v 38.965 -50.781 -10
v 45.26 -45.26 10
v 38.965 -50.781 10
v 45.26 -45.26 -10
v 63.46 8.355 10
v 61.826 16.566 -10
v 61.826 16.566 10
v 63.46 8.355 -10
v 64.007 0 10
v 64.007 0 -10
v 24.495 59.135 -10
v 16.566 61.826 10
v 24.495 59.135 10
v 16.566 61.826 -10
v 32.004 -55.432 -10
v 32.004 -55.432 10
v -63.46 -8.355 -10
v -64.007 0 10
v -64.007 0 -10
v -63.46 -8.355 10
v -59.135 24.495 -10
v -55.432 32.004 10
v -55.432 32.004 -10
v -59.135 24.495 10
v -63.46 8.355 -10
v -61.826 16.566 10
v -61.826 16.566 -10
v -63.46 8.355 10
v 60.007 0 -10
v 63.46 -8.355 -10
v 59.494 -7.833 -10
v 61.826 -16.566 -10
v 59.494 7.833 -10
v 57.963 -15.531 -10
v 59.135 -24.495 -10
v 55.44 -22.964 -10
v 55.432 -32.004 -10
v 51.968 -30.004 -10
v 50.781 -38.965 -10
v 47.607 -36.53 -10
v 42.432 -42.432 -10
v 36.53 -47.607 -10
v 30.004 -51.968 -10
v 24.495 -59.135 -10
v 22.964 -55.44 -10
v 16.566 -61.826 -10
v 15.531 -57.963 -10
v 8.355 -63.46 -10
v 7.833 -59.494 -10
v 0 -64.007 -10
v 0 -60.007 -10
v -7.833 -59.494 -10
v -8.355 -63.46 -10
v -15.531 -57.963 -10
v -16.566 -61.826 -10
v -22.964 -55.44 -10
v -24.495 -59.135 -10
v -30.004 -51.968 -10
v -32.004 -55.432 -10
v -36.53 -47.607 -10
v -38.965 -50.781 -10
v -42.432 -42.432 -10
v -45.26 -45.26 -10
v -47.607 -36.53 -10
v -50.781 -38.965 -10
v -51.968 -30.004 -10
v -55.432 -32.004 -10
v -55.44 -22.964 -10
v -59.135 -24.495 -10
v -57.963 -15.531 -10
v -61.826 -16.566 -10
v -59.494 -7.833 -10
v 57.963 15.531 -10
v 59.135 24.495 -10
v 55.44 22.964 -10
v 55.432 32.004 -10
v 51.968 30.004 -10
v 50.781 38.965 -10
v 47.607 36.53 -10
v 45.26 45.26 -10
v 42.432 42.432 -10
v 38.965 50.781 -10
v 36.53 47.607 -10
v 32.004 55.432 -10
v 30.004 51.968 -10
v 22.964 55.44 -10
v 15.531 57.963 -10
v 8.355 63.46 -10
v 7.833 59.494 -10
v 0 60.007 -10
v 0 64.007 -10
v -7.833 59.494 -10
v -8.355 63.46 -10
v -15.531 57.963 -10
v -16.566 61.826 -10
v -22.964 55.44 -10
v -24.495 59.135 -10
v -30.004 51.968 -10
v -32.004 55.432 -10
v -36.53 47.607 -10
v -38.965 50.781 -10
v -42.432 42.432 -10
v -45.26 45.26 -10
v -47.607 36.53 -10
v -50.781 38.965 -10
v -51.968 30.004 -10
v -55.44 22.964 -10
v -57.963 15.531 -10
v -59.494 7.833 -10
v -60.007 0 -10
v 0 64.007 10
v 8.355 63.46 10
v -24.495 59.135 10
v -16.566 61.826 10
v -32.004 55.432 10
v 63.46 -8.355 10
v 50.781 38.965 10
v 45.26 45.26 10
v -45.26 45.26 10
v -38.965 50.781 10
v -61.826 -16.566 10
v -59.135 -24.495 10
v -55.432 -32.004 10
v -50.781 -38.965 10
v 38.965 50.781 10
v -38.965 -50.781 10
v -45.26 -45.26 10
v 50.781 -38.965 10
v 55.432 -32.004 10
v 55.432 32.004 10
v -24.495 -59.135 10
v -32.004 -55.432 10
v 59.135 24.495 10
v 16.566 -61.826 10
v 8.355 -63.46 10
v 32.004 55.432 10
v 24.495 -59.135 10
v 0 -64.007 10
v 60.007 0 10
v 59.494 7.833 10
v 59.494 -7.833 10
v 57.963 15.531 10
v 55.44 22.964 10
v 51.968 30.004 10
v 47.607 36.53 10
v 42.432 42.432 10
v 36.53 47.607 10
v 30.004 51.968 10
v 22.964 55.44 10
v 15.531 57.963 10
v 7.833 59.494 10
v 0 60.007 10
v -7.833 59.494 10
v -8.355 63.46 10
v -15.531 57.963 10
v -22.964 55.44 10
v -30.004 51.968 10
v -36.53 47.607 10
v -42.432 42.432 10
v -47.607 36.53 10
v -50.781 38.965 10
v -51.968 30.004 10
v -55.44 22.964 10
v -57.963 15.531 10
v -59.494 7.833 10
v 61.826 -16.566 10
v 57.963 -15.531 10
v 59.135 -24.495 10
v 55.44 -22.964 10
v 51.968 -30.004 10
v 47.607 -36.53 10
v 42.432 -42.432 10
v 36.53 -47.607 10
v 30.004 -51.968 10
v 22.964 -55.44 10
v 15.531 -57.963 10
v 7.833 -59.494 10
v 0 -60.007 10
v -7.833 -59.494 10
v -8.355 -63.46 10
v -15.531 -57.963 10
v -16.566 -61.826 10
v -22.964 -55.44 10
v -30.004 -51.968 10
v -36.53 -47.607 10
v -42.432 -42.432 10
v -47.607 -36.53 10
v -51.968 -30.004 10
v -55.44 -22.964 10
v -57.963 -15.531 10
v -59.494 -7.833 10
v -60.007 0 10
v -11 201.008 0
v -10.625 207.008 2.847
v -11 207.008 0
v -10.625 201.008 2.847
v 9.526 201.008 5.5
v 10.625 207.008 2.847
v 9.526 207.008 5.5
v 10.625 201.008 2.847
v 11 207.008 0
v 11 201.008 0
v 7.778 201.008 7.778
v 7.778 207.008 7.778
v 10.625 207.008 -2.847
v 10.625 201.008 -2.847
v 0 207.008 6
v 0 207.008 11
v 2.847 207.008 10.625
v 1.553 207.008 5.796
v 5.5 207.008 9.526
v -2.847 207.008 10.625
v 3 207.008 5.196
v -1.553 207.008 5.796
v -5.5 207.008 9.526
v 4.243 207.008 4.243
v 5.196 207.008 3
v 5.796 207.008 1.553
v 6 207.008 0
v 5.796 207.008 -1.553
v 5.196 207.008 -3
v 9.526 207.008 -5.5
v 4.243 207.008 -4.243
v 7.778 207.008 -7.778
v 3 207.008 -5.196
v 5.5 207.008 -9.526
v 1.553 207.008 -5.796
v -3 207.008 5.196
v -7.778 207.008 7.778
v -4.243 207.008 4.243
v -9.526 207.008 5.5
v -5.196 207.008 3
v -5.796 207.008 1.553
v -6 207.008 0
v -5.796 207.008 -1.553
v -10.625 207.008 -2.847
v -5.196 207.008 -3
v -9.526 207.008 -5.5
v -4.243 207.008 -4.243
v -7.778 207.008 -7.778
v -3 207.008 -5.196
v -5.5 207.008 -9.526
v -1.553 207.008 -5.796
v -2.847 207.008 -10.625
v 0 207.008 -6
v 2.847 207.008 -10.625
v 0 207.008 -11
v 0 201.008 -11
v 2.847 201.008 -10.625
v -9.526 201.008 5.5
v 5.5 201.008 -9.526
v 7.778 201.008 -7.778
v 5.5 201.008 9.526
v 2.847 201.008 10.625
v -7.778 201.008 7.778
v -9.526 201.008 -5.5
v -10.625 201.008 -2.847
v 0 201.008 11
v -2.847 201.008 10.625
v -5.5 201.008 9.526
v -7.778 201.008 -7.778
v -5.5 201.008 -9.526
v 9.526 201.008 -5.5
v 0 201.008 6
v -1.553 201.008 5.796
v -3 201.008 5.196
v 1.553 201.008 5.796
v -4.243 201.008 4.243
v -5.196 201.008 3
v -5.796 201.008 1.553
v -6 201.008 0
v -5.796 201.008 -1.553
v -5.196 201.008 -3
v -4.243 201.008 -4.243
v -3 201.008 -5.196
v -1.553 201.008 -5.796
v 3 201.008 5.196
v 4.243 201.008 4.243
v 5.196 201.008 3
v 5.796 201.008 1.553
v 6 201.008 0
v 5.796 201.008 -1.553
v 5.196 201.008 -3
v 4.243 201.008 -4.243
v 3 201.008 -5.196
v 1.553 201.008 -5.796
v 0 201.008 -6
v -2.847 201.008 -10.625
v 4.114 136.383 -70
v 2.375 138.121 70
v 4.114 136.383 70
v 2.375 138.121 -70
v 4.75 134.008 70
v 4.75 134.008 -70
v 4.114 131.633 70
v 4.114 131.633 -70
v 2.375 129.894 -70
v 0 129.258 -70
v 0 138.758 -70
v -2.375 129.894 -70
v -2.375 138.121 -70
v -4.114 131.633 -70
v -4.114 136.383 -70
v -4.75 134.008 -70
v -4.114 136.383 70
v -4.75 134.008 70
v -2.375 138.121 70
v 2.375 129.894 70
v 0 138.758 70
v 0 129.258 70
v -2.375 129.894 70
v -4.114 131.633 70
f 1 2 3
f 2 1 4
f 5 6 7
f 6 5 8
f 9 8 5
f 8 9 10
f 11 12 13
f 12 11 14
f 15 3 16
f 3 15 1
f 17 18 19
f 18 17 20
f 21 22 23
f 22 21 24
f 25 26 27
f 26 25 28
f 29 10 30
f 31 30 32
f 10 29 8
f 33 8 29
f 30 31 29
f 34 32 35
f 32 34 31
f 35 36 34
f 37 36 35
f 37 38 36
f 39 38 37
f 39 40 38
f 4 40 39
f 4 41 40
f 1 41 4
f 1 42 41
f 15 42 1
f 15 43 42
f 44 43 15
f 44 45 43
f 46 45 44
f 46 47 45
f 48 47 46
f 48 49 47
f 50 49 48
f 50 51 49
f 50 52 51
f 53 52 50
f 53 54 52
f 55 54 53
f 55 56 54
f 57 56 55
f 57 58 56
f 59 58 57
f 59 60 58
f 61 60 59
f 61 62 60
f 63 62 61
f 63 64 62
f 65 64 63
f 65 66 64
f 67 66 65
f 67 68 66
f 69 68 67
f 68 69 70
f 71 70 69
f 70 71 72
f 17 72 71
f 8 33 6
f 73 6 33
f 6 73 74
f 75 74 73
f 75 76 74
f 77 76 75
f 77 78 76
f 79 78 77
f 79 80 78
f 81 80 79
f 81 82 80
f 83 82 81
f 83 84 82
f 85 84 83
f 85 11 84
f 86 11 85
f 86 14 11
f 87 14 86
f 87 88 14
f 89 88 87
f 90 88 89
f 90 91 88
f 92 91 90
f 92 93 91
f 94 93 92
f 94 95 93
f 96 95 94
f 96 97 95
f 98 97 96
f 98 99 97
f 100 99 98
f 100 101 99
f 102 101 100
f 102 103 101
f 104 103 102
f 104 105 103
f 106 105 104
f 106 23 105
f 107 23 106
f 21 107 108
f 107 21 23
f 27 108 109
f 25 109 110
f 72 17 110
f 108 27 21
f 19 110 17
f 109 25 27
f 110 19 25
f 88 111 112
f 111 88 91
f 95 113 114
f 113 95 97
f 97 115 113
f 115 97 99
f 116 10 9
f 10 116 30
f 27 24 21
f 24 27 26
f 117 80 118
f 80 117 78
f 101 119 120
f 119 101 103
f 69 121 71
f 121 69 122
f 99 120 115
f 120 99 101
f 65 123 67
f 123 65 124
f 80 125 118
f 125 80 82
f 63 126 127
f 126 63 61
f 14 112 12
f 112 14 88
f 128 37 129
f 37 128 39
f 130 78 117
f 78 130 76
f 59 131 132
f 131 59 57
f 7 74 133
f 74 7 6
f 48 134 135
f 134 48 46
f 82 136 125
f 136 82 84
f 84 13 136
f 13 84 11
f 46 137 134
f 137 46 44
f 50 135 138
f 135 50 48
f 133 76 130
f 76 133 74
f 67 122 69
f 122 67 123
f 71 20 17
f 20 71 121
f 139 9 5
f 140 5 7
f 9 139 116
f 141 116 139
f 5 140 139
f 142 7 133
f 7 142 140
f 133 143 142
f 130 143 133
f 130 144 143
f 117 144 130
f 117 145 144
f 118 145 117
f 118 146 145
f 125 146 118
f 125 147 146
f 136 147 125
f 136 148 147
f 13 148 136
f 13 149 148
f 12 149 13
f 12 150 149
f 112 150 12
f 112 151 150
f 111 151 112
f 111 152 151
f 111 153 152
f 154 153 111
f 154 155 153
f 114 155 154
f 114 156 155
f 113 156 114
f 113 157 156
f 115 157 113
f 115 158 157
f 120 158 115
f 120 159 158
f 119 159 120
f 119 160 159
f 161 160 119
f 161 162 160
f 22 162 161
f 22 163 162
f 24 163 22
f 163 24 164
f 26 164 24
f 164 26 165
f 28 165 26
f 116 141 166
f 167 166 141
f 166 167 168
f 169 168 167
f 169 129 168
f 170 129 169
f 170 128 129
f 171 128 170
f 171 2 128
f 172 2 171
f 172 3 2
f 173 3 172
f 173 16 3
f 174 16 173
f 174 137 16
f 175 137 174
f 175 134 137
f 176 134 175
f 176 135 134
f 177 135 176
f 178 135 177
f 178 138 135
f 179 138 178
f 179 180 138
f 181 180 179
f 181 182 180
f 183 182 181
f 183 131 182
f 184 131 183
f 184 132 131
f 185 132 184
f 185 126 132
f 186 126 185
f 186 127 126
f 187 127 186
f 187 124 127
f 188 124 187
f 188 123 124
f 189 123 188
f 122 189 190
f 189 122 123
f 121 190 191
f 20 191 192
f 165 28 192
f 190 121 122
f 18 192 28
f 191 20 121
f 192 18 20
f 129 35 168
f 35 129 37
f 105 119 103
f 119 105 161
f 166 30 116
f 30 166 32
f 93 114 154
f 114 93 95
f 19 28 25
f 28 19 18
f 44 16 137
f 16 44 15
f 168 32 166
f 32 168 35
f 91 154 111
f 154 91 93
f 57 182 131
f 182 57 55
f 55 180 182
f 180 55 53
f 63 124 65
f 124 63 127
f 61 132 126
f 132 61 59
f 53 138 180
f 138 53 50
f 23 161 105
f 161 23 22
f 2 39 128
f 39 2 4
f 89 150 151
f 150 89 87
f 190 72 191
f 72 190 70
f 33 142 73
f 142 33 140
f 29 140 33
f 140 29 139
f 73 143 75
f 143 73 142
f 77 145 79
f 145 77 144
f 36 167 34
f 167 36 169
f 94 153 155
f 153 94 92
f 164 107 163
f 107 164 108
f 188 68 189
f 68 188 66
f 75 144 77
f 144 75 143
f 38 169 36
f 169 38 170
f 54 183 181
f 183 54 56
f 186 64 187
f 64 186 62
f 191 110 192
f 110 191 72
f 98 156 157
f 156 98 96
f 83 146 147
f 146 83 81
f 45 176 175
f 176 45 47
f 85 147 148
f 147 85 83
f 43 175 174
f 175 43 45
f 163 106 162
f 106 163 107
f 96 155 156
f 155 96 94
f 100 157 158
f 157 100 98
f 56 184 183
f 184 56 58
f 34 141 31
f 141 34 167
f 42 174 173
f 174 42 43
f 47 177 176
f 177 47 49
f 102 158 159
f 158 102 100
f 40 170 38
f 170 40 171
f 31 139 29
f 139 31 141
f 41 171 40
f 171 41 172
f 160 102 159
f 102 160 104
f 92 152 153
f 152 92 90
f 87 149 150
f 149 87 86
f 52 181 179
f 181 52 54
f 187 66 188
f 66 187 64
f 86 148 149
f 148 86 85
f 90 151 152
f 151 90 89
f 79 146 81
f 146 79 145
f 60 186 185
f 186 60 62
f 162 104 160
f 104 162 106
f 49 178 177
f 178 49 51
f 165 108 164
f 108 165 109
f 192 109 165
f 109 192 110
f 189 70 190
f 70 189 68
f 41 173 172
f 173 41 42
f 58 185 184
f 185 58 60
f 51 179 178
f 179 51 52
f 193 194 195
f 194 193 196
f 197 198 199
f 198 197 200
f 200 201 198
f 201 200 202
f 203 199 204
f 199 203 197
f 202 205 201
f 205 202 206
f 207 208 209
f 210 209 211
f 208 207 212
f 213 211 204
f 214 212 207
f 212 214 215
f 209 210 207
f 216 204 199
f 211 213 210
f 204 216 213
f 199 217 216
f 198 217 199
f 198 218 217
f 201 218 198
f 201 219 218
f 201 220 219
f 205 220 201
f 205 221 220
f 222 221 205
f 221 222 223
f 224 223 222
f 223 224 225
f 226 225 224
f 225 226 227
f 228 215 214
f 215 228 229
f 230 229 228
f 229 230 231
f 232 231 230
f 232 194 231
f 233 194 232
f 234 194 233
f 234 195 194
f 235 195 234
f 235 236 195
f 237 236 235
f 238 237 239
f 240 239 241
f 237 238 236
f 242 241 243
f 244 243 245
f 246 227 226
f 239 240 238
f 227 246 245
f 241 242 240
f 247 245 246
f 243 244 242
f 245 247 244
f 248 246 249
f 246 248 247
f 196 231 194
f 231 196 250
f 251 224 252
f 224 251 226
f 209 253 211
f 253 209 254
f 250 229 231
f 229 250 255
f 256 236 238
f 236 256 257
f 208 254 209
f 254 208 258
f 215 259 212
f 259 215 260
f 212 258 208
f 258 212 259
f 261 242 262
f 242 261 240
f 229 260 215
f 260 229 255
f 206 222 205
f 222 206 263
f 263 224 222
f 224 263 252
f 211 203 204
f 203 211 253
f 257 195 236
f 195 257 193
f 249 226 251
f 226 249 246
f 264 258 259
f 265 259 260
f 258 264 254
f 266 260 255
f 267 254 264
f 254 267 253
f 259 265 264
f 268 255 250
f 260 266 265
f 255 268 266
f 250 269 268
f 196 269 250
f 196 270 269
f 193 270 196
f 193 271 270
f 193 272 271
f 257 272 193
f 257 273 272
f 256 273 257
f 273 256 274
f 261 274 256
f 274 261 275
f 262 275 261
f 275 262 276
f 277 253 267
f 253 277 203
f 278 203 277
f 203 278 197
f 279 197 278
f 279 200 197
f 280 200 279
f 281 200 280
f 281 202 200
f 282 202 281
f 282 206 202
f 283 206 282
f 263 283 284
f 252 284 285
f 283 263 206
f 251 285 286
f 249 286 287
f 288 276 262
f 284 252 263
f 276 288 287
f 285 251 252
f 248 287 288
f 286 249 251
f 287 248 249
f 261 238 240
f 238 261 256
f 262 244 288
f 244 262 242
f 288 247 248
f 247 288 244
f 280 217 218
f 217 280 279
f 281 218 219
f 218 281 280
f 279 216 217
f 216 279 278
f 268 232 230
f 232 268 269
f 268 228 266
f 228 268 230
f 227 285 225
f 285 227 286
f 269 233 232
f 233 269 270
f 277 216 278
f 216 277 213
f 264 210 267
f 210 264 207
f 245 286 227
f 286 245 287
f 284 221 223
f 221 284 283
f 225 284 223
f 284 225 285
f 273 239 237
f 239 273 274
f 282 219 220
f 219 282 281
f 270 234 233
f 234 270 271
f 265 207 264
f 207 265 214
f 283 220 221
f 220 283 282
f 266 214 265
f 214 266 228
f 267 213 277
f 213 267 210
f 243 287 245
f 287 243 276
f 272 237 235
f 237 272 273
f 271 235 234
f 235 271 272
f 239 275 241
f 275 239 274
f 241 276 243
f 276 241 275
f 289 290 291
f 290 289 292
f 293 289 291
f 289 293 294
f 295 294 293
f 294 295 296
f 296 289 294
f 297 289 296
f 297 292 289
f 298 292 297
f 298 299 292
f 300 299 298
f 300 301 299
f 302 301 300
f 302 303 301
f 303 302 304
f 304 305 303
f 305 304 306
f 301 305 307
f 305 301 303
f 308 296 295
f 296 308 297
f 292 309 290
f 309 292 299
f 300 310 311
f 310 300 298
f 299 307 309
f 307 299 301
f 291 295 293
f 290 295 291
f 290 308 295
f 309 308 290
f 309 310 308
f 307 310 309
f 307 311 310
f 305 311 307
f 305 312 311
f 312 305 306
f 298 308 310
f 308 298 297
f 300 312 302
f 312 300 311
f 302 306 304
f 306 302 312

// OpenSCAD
// Auto-generated by scripts/author_from_manifest.py (Phase D.3).
// Source: data/phase_d_manifest.json (sku_intent='tolco-fig4-swivel-ring-4in').
// Do not hand-edit — regenerate from the manifest.
//
// @part tolco_fig4_swivel_ring_4in
// @kind hanger
// @category hanger.swivel.ring
// @display-name "Tolco FIG 4 Adjustable Swivel Ring Hanger 4\""
// @mfg nvent_tolco
// @mfg-pn FIG_4_4in
// @listing UL
// @price-usd 6.70
// @install-minutes 4
// @crew journeyman
// @param size_in number default=4 label="Size" unit="in"
// @port pipe position=[0,0,0] direction=[0,1,0] style=grooved size_in=4 role=run_a

size_in = 4.0;

function od_mm(nps) =
    nps ==   1  ? 33.4 :
    nps == 1.25 ? 42.2 :
    nps == 1.5  ? 48.3 :
    nps ==   2  ? 60.3 :
    nps == 2.5  ? 73.0 :
    nps ==   3  ? 88.9 :
    nps ==   4  ? 114.3 :
    nps ==   6  ? 168.3 :
    nps ==   8  ? 219.1 : 60.3;

od = od_mm(size_in);
ring_id = od * 1.05;
ring_od = ring_id + 8;
strap_w = 20;
rod_len = 140;

union() {
    // Ring
    difference() {
        cylinder(h = strap_w, d = ring_od, center = true, $fn = 48);
        cylinder(h = strap_w + 1, d = ring_id, center = true, $fn = 48);
    }
    // Rod up +Y
    translate([0, rod_len/2 + ring_od/2, 0])
        cylinder(h = rod_len, d = 9.5, center = true, $fn = 12);
    // Top swivel eye
    translate([0, rod_len + ring_od/2, 0])
        rotate([90, 0, 0])
        difference() {
            cylinder(h = 6, d = 22, center = true, $fn = 24);
            cylinder(h = 8, d = 12, center = true, $fn = 24);
        }
}
